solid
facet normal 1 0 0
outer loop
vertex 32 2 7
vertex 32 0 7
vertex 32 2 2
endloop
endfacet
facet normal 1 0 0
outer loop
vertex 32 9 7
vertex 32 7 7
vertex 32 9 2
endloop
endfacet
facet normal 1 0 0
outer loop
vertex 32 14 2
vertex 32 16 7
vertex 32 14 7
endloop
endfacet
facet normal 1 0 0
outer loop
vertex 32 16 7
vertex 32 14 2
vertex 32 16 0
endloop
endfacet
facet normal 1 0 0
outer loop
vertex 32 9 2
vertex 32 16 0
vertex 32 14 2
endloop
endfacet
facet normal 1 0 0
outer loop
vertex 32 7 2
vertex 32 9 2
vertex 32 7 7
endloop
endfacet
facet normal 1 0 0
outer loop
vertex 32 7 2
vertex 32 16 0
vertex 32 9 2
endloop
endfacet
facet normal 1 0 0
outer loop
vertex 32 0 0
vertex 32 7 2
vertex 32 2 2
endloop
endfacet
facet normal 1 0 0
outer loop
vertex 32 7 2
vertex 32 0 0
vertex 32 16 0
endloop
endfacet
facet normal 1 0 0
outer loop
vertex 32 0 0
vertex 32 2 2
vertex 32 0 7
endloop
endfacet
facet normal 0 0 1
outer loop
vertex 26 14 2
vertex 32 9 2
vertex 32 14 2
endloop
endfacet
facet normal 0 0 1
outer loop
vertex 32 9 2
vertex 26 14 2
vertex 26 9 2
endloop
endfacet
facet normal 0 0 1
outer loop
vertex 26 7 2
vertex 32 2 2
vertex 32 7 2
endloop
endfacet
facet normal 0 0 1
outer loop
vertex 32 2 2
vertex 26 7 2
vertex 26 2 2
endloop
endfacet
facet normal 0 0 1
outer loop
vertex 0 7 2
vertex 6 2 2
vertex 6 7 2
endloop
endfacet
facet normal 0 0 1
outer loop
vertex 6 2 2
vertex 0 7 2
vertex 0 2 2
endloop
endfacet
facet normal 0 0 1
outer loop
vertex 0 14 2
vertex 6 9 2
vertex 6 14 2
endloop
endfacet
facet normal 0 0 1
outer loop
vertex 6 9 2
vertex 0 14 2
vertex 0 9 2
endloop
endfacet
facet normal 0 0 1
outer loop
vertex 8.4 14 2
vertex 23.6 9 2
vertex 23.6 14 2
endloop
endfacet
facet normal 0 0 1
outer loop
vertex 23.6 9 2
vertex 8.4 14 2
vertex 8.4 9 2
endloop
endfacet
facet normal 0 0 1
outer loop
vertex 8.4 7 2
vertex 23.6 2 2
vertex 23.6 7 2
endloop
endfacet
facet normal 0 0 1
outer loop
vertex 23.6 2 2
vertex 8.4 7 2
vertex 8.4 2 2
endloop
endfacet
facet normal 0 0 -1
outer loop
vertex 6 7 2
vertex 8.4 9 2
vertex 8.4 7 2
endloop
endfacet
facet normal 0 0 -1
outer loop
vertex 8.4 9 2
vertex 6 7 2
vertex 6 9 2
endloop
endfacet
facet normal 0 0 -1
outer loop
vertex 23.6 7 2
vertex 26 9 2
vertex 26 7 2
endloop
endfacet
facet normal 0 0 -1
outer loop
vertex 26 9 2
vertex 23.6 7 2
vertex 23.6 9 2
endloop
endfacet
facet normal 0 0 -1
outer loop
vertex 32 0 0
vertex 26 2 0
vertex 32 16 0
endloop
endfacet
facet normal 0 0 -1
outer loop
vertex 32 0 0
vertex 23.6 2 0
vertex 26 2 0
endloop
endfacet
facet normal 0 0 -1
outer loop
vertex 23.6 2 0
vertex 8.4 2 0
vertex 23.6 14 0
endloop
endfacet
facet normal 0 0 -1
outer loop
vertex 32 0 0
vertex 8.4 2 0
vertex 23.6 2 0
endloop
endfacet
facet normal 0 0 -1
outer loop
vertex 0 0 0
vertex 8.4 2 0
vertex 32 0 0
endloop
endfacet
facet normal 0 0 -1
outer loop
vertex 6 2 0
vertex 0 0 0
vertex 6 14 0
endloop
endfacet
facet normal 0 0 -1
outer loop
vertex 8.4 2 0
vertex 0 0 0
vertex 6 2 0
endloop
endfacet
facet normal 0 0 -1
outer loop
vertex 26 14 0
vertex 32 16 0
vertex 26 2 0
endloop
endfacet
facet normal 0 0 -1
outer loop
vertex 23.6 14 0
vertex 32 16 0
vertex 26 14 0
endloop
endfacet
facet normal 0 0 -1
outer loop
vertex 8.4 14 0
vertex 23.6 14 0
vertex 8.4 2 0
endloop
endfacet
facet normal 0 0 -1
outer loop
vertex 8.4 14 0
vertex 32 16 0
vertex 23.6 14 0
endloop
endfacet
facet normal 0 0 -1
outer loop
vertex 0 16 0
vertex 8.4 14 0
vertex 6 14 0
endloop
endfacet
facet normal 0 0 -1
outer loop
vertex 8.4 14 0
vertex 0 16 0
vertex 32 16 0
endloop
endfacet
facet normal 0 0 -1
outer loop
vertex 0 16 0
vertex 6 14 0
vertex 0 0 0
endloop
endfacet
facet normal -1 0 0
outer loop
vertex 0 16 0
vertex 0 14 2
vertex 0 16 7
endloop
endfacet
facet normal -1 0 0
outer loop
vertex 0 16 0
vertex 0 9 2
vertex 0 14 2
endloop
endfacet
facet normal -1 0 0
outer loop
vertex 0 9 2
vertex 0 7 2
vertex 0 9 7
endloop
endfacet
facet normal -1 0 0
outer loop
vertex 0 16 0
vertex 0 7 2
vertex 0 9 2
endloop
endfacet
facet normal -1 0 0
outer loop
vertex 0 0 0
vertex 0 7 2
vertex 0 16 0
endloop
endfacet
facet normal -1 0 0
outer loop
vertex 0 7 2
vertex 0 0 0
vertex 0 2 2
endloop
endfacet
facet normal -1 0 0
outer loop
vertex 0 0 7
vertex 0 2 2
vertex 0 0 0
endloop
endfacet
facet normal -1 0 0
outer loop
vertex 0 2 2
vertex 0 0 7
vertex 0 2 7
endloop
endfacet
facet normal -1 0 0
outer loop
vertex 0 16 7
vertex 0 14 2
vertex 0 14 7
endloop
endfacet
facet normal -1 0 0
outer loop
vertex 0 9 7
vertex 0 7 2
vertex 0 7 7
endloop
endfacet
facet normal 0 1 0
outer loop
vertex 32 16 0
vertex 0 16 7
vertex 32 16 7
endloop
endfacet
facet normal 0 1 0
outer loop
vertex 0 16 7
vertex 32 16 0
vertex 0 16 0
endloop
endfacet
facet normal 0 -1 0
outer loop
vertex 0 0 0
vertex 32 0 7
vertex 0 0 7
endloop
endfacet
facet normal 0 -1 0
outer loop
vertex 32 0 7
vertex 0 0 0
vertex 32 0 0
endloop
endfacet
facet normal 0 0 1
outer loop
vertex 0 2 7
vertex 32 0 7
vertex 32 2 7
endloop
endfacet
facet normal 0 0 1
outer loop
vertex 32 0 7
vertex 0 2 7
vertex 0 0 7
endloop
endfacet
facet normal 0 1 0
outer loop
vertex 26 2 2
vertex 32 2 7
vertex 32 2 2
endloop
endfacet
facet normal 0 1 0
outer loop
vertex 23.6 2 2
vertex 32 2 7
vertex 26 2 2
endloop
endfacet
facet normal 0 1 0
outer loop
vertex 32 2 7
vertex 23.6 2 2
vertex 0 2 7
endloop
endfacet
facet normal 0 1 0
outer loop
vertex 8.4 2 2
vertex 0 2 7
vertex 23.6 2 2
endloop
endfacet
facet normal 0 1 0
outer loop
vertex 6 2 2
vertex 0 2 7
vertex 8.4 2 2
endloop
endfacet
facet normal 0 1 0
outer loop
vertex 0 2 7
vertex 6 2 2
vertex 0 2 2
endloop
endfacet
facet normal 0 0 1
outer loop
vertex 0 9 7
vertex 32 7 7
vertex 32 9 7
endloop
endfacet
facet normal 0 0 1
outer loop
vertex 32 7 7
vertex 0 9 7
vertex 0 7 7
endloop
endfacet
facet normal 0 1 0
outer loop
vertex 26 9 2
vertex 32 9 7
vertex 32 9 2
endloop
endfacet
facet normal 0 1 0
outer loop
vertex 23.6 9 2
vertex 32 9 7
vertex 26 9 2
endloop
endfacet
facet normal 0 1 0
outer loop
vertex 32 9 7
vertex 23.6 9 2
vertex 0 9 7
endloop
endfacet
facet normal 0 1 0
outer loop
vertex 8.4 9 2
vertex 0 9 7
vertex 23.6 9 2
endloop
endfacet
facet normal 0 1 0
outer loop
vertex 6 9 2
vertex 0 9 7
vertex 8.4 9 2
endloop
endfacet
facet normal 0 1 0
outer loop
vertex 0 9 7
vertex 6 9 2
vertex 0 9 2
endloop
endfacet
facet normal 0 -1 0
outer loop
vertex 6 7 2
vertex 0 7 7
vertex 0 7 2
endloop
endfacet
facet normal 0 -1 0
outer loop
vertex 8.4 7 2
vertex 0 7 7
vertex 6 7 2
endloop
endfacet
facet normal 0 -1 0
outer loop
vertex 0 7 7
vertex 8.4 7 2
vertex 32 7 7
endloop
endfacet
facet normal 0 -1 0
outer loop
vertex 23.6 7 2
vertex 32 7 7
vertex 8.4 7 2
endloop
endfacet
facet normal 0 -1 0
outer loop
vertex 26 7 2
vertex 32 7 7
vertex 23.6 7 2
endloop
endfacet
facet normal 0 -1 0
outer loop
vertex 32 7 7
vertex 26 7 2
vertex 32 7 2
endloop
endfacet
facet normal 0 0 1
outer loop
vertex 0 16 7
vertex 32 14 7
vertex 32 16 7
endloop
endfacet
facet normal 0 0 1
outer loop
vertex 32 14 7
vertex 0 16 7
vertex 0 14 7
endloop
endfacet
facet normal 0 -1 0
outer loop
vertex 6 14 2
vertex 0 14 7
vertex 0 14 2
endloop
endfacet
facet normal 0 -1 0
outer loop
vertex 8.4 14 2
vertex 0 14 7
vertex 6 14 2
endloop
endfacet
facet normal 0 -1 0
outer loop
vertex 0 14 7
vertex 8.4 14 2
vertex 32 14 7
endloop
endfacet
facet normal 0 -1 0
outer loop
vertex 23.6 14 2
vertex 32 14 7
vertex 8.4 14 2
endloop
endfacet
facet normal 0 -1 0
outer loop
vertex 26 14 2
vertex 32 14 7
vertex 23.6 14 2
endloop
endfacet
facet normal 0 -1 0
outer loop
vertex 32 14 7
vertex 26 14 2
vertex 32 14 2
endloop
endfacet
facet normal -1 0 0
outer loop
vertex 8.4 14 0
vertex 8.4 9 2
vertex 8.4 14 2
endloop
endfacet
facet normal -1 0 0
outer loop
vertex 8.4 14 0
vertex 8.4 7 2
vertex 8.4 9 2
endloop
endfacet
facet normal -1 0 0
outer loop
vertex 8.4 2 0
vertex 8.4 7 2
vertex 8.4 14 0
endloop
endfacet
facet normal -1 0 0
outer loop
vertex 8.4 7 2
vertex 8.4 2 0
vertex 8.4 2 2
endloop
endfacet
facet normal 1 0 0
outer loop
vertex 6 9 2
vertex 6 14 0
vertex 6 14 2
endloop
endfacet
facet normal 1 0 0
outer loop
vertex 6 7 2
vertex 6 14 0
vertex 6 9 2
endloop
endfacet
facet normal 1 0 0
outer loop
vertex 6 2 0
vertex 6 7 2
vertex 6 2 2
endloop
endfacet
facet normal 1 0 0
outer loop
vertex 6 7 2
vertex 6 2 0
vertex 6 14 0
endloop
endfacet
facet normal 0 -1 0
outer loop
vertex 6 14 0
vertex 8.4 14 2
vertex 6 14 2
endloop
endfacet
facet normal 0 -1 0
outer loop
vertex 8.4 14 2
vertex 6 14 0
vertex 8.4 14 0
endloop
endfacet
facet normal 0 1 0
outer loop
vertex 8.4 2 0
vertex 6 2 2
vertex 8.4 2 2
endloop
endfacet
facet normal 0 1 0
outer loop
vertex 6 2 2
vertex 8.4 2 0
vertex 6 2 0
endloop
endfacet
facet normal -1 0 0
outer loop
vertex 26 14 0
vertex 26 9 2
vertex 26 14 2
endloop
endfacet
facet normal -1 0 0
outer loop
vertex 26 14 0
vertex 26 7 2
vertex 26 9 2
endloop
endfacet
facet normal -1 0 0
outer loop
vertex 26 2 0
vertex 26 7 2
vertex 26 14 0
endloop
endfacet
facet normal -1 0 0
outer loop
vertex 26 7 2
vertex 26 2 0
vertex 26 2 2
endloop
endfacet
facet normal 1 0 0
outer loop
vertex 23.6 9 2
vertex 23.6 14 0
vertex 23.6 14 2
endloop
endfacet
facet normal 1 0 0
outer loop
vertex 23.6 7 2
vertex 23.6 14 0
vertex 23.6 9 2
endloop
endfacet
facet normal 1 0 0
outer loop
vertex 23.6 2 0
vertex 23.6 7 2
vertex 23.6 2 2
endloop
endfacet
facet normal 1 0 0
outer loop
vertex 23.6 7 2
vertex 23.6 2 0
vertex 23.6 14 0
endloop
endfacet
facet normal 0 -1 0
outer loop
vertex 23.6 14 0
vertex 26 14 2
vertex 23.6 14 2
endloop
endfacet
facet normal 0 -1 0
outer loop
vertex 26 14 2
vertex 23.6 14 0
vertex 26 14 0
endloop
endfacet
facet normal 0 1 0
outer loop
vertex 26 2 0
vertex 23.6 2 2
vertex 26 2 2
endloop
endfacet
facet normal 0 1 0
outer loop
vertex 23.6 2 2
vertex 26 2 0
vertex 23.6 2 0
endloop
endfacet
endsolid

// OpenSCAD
// Original MechIntel educational model. CC0-1.0. Units: mm.
// Not a standardized or load-rated component.
$fn=96;
length=32;
width=16;
base=2;
rail=2;
height=5;
slot=2.4;
$fn=64;
difference(){
 union(){
  translate([0,0,0]) cube([length,width,base]);
  translate([0,0,base]) cube([length,rail,height]);
  translate([0,7,base]) cube([length,rail,height]);
  translate([0,14,base]) cube([length,rail,height]);
 }
 translate([6,2,-1]) cube([slot,12,base+1]);
 translate([length-6-slot,2,-1]) cube([slot,12,base+1]);
}
